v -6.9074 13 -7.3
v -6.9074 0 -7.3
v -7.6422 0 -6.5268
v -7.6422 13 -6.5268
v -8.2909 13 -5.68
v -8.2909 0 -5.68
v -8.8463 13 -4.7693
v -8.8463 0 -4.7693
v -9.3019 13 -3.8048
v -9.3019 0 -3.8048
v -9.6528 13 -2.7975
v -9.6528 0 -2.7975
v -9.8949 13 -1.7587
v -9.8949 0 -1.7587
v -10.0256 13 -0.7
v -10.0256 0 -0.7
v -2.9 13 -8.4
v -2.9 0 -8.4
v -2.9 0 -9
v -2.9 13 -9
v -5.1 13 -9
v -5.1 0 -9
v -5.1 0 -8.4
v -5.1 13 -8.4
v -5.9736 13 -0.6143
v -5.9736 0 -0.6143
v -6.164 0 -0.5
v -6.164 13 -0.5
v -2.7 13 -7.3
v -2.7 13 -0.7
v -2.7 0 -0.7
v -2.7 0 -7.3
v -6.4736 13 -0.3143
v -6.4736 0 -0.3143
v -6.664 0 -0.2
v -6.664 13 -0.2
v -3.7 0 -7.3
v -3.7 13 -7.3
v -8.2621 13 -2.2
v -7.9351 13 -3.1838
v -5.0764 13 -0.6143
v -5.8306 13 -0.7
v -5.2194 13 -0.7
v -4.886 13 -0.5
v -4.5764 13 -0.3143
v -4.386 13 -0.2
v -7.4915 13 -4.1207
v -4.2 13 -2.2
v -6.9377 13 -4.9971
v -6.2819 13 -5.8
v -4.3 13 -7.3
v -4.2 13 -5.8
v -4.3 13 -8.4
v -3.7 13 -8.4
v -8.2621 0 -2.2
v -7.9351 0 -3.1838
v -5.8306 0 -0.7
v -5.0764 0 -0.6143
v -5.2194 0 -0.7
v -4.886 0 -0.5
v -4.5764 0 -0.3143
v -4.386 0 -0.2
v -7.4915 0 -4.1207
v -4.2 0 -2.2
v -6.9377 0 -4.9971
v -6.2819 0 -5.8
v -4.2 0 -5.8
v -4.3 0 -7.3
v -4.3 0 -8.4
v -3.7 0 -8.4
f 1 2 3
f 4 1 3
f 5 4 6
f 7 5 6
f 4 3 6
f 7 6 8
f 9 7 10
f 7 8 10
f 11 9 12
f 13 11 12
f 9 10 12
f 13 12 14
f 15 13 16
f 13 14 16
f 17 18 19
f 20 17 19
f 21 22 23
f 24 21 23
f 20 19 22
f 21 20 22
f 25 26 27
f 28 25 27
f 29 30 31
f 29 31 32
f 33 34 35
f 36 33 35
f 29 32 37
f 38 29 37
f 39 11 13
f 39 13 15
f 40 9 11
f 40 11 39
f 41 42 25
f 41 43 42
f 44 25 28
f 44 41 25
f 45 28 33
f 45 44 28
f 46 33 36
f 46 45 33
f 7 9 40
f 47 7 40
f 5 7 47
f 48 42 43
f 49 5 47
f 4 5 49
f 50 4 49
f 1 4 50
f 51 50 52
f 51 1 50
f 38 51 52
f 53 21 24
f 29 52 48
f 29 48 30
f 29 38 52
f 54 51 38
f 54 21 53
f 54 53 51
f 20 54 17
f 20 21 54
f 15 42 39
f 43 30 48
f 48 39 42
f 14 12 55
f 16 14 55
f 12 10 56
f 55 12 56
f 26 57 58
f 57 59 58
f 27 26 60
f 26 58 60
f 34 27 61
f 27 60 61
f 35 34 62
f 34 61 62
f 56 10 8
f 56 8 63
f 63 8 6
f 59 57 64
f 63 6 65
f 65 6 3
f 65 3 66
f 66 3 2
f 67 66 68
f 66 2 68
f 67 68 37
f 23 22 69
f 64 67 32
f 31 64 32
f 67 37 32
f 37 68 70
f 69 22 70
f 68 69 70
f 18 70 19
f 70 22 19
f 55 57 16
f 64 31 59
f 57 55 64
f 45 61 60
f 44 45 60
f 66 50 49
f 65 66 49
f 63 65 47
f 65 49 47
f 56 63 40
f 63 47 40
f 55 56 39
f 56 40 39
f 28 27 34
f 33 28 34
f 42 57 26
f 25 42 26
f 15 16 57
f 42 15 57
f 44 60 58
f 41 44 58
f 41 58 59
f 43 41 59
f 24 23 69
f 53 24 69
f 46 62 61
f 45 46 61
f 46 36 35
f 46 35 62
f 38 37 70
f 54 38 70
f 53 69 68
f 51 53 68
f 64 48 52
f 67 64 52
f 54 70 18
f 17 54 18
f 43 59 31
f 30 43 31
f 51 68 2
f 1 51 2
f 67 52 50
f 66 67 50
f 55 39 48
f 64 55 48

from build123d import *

# Parameters (mm, degrees)
SKETCH1_W           = 0.6
SKETCH1_H           = 0.2
BOSS_EXTRUDE1_DEPTH = 13
CUT_EXTRUDE1_DEPTH  = 14


with BuildPart() as part:
    # Sketch1 → Boss-Extrude1 (new body)
    with BuildSketch(Plane(origin=(0, 0, 0), x_dir=(1, 0, 0), z_dir=(0, 1, 0))):
        with BuildLine():
            Line((-2.7, 0.7), (-2.7, 7.3))
            Line((-2.7, 7.3), (-3.7, 7.3))
            Line((-3.7, 7.3), (-4.3, 7.3))
            Line((-4.3, 7.3), (-6.907423543, 7.3))
            ThreePointArc((-6.907423543, 7.3), (-9.08690024, 4.293104241), (-10.025592252, 0.7))
            Line((-10.025592252, 0.7), (-6.025, 0.7))
            Line((-6.025, 0.7), (-5.830634937, 0.7))
            Line((-5.830634937, 0.7), (-5.219365063, 0.7))
            Line((-5.219365063, 0.7), (-5.025, 0.7))
            Line((-5.025, 0.7), (-2.7, 0.7))
        make_face()
        Polygon((-5.076449576, 0.614250707), (-5.219365063, 0.7), (-5.830634937, 0.7), (-5.973550424, 0.614250707), (-6.16396827, 0.5), (-4.88603173, 0.5), align=None)
        Polygon((-4.576449576, 0.314250707), (-4.88603173, 0.5), (-6.16396827, 0.5), (-6.473550424, 0.314250707), (-6.66396827, 0.2), (-4.38603173, 0.2), align=None)
        with Locations((-4, 7.4)):
            Rectangle(SKETCH1_W, SKETCH1_H)
        with BuildLine():
            Line((-4.3, 7.5), (-3.7, 7.5))
            Line((-3.7, 7.5), (-3.7, 8.4))
            Line((-3.7, 8.4), (-2.9, 8.4))
            Line((-2.9, 8.4), (-2.9, 9))
            Line((-2.9, 9), (-4.472415455, 9))
            ThreePointArc((-4.472415455, 9), (-4.789229045, 8.835484432), (-5.1, 8.659821014))
            Line((-5.1, 8.659821014), (-5.1, 8.4))
            Line((-5.1, 8.4), (-4.3, 8.4))
            Line((-4.3, 8.4), (-4.3, 7.5))
        make_face()
        with BuildLine():
            Line((-5.1, 8.891147283), (-5.1, 8.659821014))
            ThreePointArc((-5.1, 8.659821014), (-4.789229045, 8.835484432), (-4.472415455, 9))
            Line((-4.472415455, 9), (-4.905354218, 9))
            ThreePointArc((-4.905354218, 9), (-5.002973164, 8.946103035), (-5.1, 8.891147283))
        make_face()
        with BuildLine():
            Line((-5.1, 9), (-5.1, 8.891147283))
            ThreePointArc((-5.1, 8.891147283), (-5.002973164, 8.946103035), (-4.905354218, 9))
            Line((-4.905354218, 9), (-5.1, 9))
        make_face()
    extrude(amount=BOSS_EXTRUDE1_DEPTH)

    # Sketch2 → Cut-Extrude1 (cut, through all)
    with BuildSketch(Plane(origin=(0, 13, 0), x_dir=(1, 0, 0), z_dir=(0, 1, 0))):
        with BuildLine():
            Line((-4.2, 5.8), (-6.281918497, 5.8))
            ThreePointArc((-6.281918497, 5.8), (-7.491475696, 4.120714974), (-8.262112321, 2.2))
            Line((-8.262112321, 2.2), (-4.2, 2.2))
            Line((-4.2, 2.2), (-4.2, 5.8))
        make_face()
    extrude(amount=-CUT_EXTRUDE1_DEPTH, mode=Mode.SUBTRACT)


solid = part.part
